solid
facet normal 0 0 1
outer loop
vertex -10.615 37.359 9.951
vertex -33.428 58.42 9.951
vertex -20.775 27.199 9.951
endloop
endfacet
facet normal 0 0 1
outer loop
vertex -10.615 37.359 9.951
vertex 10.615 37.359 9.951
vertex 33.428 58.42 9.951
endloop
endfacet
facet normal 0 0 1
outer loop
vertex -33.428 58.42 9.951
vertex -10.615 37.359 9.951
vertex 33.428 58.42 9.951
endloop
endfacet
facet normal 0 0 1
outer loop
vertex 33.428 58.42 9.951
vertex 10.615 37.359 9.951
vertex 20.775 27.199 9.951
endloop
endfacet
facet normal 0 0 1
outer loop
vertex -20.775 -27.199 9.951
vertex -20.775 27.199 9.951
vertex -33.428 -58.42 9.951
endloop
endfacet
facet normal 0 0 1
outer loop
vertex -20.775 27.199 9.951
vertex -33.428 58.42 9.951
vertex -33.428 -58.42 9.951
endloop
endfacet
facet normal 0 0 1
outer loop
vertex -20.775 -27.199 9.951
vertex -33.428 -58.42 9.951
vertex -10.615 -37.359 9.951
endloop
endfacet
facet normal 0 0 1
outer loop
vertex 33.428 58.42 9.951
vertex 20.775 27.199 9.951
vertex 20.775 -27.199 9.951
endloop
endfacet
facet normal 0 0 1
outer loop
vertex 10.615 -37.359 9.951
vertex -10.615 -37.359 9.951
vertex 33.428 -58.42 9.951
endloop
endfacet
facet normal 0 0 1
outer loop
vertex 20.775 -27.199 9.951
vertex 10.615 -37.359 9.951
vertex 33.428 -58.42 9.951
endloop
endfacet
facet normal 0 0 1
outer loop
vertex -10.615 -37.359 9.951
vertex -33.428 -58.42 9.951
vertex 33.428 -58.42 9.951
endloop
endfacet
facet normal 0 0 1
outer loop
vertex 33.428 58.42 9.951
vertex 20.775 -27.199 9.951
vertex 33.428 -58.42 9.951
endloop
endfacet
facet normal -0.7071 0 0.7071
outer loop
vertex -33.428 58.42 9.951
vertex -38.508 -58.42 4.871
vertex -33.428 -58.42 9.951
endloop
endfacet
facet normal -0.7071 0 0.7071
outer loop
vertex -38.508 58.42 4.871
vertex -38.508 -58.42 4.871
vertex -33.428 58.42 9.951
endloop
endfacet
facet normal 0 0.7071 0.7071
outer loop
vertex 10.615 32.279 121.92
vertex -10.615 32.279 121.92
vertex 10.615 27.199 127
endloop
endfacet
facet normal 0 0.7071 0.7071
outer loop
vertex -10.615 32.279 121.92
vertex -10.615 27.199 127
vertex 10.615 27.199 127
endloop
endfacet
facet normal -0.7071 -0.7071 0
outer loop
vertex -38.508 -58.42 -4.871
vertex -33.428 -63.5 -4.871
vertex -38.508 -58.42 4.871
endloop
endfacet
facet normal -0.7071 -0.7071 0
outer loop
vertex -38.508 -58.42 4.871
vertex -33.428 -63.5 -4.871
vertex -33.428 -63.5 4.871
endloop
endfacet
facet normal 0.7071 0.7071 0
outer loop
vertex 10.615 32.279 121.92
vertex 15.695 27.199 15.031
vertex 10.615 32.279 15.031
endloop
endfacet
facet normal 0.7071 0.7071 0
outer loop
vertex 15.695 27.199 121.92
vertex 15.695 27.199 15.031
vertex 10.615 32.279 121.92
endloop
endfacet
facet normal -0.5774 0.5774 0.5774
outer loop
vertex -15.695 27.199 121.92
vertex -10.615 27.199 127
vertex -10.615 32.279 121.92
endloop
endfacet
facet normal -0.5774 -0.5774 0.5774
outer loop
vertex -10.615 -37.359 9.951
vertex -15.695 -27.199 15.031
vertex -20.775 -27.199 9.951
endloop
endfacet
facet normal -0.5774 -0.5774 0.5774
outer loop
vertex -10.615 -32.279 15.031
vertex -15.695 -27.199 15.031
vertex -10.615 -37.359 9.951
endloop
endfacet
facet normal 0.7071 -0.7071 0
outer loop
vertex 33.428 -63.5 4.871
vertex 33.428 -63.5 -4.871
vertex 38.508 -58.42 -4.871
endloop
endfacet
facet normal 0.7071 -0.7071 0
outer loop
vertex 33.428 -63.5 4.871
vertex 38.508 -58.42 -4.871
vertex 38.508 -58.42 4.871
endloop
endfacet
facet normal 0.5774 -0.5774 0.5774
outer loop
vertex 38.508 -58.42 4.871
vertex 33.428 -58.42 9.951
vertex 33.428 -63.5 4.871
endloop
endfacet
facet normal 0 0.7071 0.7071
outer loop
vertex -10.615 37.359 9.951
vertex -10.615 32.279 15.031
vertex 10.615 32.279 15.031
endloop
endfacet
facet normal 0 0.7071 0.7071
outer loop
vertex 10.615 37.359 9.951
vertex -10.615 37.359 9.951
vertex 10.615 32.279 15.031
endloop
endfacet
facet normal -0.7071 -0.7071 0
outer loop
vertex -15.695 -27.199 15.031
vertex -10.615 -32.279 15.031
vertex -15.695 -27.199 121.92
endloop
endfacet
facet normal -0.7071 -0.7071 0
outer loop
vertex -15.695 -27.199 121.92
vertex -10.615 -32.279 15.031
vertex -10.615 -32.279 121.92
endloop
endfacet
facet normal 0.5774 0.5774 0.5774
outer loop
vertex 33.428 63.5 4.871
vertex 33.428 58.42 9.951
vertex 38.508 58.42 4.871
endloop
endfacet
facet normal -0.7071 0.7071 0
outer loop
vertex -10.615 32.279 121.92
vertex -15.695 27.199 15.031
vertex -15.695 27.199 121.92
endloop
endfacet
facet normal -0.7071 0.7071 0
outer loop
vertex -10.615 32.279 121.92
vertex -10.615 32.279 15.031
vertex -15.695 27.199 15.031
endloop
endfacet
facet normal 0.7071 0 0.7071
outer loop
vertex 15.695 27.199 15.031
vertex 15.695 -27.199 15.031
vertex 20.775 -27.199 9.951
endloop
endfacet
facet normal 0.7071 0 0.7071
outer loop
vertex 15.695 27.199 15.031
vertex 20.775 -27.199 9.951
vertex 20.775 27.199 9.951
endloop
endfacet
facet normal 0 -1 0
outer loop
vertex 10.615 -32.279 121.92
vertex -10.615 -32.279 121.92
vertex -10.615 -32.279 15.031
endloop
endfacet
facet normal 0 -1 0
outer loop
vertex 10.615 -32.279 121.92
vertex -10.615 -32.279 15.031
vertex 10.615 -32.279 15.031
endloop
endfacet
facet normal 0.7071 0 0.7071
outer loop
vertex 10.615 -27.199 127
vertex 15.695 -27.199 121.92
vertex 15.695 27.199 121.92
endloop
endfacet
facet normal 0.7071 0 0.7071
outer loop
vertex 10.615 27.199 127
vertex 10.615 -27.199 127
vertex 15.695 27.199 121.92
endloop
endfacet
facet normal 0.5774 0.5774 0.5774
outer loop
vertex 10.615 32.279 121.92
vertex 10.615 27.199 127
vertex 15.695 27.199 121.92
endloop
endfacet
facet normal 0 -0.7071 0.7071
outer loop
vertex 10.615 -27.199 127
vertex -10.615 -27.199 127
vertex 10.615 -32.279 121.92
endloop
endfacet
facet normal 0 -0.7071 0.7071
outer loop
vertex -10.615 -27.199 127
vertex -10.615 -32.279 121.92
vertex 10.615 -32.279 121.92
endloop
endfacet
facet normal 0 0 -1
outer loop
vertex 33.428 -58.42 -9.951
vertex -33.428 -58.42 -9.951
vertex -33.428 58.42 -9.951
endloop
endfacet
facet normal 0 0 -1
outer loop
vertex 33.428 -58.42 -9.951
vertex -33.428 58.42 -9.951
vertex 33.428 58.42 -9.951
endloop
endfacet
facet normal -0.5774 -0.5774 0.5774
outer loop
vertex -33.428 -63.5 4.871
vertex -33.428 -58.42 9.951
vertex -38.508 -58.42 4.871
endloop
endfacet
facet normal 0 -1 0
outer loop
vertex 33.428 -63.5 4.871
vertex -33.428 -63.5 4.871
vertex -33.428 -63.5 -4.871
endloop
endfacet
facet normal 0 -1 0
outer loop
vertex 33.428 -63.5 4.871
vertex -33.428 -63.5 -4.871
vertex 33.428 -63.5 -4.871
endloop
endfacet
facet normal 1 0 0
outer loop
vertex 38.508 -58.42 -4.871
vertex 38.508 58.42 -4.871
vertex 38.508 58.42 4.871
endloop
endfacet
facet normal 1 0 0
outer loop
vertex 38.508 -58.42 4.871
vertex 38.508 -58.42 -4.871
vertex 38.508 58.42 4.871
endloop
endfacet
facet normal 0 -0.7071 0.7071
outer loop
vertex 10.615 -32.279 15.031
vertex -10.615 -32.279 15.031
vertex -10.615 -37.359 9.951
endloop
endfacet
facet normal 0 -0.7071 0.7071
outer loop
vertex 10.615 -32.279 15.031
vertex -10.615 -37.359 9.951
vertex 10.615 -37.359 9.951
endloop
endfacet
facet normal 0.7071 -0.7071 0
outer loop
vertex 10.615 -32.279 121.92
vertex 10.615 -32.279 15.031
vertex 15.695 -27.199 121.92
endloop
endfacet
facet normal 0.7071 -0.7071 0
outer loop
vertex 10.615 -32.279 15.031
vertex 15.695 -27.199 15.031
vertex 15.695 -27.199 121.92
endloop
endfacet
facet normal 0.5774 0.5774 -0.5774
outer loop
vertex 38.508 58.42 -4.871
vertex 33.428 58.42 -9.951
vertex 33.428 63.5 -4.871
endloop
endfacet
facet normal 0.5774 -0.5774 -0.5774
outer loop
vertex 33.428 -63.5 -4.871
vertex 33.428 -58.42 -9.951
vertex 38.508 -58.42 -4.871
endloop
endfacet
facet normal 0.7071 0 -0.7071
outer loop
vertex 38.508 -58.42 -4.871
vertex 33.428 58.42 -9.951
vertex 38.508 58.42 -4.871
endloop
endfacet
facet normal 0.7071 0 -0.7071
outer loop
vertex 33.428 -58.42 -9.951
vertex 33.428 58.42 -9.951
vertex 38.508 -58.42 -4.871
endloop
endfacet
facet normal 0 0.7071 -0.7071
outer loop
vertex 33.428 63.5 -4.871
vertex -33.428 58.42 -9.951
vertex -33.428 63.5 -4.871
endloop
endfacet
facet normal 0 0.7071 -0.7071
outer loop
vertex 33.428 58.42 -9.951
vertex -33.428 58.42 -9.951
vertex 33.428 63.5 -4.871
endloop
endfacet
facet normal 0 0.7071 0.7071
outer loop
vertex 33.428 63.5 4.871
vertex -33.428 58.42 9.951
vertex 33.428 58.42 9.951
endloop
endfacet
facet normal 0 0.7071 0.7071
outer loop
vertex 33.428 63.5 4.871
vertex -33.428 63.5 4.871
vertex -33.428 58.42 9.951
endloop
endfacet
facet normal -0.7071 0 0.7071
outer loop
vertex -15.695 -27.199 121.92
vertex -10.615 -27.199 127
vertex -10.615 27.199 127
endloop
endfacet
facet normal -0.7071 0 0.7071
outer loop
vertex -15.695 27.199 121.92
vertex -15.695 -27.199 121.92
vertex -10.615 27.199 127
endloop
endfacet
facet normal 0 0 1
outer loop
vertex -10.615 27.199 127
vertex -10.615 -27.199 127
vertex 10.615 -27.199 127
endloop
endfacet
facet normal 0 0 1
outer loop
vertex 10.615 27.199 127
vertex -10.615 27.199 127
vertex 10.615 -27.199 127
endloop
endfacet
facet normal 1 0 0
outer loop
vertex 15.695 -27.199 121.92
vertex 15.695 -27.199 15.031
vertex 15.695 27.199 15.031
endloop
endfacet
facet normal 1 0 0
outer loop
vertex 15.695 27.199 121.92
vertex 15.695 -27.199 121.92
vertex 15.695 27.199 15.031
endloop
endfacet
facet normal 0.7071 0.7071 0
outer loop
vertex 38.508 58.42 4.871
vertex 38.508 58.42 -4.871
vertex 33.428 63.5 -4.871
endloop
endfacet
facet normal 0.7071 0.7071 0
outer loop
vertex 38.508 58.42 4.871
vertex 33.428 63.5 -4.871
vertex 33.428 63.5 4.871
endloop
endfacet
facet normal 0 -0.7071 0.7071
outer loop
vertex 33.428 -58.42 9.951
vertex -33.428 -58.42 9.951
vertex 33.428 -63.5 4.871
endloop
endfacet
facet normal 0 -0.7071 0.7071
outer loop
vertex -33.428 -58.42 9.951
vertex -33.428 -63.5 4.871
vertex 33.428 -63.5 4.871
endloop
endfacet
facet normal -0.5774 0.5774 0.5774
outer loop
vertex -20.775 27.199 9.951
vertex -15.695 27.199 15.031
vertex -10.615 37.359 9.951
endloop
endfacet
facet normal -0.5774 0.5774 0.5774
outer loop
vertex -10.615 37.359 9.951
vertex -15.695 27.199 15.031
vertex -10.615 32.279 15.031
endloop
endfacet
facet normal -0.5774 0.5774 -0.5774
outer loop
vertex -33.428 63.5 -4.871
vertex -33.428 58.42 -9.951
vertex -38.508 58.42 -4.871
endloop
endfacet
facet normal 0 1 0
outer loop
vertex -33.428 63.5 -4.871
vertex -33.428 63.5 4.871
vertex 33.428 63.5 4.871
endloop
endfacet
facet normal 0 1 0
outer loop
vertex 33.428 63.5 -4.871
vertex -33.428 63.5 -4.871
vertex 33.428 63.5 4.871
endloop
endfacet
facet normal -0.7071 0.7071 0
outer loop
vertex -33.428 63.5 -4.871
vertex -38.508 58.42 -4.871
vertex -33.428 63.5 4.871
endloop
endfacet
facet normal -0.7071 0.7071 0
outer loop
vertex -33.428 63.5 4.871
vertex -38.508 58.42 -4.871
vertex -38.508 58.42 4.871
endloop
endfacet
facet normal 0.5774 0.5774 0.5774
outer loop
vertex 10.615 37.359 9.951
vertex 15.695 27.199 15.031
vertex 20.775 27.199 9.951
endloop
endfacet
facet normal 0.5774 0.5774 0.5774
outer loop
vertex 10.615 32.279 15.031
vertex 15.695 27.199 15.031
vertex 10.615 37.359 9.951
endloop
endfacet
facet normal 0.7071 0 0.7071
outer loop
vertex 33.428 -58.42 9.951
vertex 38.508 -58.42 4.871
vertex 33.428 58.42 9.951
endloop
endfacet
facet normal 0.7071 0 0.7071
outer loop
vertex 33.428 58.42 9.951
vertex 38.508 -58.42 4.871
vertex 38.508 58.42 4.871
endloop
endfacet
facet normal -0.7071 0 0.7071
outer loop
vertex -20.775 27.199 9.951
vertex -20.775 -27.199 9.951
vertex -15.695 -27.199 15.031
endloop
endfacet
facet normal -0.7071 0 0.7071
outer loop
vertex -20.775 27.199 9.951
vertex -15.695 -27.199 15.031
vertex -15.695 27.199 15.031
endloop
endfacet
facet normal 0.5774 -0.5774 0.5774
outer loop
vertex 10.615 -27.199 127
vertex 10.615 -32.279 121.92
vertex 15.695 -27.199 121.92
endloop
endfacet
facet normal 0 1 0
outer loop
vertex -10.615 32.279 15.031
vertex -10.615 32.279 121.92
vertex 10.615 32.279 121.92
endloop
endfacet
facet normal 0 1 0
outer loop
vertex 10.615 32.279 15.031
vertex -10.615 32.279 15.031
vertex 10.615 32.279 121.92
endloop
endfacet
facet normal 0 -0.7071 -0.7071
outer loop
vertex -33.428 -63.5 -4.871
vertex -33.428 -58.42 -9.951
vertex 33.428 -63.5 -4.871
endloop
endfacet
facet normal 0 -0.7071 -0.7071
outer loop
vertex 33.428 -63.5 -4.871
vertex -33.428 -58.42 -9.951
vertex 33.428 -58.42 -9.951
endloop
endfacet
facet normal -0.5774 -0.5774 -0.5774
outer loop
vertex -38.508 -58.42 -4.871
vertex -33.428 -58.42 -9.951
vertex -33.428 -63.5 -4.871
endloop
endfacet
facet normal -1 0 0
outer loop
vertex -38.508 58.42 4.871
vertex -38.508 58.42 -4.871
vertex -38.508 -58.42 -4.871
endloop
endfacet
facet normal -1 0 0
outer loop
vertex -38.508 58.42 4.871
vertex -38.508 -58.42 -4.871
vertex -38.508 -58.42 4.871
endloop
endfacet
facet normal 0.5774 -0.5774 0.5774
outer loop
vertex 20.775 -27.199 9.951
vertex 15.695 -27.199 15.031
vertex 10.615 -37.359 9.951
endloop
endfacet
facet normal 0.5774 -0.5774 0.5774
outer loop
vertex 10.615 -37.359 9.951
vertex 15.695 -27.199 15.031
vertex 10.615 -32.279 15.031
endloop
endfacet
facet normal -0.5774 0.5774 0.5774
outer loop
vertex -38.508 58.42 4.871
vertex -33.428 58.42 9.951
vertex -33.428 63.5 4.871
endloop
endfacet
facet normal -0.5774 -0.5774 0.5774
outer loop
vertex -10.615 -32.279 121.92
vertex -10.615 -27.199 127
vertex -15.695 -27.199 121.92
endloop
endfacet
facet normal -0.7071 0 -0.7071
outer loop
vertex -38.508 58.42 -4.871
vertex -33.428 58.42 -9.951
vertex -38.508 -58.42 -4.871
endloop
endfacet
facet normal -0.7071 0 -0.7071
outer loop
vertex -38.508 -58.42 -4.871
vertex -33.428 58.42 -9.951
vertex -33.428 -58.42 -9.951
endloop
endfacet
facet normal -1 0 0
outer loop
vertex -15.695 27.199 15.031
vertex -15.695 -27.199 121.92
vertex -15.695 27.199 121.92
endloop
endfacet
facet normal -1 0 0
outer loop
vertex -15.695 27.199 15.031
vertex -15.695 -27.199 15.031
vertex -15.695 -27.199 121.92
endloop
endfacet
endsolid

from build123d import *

# Parameters (mm, degrees)
F0_W     = 77.0167037845
F0_H     = 19.9013762176
F1_DEPTH = 63.5
F2_W     = 31.3891619444
F2_H     = 64.5581185818
F3_DEPTH = 127
F4_SIZE2 = 5.08
F4_SIZE  = 5.08


# Not quite as in the source:
# - the program builds the solid bodies; features that only make, move or delete a surface that nothing else refers to are left out


with BuildPart() as f1:
    # F0 (on Front) → F1 (new body, symmetric)
    with BuildSketch(Plane.XZ):
        Rectangle(F0_W, F0_H)
    extrude(amount=F1_DEPTH, both=True)

    # F2 (on Top) → F3 (join)
    with BuildSketch(Plane.XY):
        Rectangle(F2_W, F2_H)
    extrude(amount=F3_DEPTH)

    # F4
    f4_edges = [f1.edges().sort_by_distance(p)[0] for p in [
        (0, -32.279059, 127),
        (15.694581, -32.279059, 68.475344),
        (0, 32.279059, 127),
        (15.694581, 0, 127),
        (-15.694581, 0, 127),
        (15.694581, 32.279059, 68.475344),
        (-15.694581, 32.279059, 68.475344),
        (-15.694581, -32.279059, 68.475344),
        (15.694581, 0, 9.950688),
        (38.508352, 0, 9.950688),
        (0, -63.5, 9.950688),
        (0, 63.5, 9.950688),
        (-38.508352, 0, 9.950688),
        (0, -63.5, -9.950688),
        (-38.508352, 0, -9.950688),
        (0, 63.5, -9.950688),
        (38.508352, 0, -9.950688),
        (38.508352, 63.5, 0),
        (-38.508352, 63.5, 0),
        (38.508352, -63.5, 0),
        (-38.508352, -63.5, 0),
        (-15.694581, 0, 9.950688),
        (0, -32.279059, 9.950688),
        (0, 32.279059, 9.950688),
    ]]
    chamfer(f4_edges, length=F4_SIZE, length2=F4_SIZE2)


solid = f1.part
